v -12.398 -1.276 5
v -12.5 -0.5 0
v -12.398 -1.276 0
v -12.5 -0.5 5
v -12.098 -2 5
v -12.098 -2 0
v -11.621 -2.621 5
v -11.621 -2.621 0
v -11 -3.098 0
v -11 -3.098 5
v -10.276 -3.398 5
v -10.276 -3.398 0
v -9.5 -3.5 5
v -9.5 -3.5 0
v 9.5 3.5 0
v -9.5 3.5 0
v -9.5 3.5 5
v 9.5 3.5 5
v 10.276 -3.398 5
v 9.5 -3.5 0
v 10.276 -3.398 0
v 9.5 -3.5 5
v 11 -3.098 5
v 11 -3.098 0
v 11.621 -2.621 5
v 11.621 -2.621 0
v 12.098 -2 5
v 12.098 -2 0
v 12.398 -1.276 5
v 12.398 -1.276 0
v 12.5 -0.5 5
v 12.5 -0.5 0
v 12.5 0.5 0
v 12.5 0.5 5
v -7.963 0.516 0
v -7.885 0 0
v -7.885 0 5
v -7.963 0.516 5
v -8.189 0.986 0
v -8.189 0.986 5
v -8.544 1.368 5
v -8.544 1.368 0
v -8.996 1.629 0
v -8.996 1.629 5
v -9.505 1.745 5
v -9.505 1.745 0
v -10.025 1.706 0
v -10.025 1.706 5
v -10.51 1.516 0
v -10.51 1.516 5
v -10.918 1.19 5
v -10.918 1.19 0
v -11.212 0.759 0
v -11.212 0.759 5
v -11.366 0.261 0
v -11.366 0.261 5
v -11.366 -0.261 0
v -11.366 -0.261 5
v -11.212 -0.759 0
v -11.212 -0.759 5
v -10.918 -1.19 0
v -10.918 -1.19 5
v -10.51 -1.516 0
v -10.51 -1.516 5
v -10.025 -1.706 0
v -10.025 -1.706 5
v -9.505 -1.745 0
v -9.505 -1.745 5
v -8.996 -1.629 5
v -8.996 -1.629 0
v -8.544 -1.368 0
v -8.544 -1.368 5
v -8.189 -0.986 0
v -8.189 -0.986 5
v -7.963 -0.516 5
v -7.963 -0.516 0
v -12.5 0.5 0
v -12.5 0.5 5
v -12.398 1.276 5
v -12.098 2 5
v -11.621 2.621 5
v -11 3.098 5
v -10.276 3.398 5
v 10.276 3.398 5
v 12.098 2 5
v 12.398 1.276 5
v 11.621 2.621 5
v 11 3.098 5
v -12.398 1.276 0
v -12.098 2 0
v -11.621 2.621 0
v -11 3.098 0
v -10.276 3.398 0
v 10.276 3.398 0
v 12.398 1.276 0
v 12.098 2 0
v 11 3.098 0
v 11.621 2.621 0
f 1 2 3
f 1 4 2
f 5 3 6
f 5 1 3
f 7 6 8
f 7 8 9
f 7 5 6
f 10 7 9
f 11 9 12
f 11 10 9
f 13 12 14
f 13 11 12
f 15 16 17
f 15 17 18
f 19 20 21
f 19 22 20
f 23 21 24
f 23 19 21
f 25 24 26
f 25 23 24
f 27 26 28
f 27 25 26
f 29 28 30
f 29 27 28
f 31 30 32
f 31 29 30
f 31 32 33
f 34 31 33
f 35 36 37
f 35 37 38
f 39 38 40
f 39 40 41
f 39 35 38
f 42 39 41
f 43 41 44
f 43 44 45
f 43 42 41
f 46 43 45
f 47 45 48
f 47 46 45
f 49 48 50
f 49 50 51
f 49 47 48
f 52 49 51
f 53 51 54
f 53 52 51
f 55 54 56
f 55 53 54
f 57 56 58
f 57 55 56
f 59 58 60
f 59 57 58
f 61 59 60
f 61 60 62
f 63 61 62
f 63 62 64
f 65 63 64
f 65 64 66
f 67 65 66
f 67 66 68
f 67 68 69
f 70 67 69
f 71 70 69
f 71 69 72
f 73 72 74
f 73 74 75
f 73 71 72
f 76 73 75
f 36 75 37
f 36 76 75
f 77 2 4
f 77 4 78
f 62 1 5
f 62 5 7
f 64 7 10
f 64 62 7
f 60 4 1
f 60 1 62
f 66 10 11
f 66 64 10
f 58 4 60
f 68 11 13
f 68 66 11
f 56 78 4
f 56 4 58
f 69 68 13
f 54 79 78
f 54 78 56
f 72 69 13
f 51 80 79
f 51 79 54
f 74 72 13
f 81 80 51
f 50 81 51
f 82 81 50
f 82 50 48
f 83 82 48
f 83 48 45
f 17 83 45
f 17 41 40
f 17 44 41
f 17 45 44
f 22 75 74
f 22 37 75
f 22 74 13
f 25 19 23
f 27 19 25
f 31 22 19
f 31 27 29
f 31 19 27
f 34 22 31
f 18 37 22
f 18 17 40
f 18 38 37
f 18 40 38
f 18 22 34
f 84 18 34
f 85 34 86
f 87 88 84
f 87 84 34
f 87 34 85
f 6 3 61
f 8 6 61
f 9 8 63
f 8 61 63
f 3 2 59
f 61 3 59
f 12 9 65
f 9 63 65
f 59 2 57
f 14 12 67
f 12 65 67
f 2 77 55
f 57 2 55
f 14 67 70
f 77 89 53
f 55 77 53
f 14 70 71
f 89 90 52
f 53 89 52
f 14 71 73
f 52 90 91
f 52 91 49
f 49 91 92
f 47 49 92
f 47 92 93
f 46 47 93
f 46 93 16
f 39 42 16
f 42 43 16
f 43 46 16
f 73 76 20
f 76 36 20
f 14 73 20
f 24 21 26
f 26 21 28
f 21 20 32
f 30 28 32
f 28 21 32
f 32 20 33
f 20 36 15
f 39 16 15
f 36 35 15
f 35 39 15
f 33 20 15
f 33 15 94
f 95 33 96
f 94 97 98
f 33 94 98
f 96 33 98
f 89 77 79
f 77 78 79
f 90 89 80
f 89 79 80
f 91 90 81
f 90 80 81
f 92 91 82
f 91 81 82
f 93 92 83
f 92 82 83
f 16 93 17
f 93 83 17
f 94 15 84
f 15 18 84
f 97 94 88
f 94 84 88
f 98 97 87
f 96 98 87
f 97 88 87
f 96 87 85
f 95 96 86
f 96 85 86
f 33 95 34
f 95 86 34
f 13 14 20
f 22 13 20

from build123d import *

# Parameters (mm, degrees)
SKETCH1_W           = 25
SKETCH1_H           = 7
SKETCH1_R           = 1.75
BOSS_EXTRUDE1_DEPTH = 5
FILLET1_R           = 3
FILLET2_R           = 3


with BuildPart() as part:
    # Sketch1 → Boss-Extrude1 (new body)
    with BuildSketch(Plane.XY):
        Rectangle(SKETCH1_W, SKETCH1_H)
        with Locations((-9.635416667, 0)):
            Circle(SKETCH1_R, mode=Mode.SUBTRACT)
    extrude(amount=BOSS_EXTRUDE1_DEPTH)

    # Fillet1
    fillet1_edges = [part.edges().sort_by_distance(p)[0] for p in [
        (-12.5, -3.5, 2.5),
        (-12.5, 3.5, 2.5),
    ]]
    fillet(fillet1_edges, radius=FILLET1_R)

    # Fillet2
    fillet2_edges = [part.edges().sort_by_distance(p)[0] for p in [
        (12.5, -3.5, 2.5),
        (12.5, 3.5, 2.5),
    ]]
    fillet(fillet2_edges, radius=FILLET2_R)


solid = part.part
